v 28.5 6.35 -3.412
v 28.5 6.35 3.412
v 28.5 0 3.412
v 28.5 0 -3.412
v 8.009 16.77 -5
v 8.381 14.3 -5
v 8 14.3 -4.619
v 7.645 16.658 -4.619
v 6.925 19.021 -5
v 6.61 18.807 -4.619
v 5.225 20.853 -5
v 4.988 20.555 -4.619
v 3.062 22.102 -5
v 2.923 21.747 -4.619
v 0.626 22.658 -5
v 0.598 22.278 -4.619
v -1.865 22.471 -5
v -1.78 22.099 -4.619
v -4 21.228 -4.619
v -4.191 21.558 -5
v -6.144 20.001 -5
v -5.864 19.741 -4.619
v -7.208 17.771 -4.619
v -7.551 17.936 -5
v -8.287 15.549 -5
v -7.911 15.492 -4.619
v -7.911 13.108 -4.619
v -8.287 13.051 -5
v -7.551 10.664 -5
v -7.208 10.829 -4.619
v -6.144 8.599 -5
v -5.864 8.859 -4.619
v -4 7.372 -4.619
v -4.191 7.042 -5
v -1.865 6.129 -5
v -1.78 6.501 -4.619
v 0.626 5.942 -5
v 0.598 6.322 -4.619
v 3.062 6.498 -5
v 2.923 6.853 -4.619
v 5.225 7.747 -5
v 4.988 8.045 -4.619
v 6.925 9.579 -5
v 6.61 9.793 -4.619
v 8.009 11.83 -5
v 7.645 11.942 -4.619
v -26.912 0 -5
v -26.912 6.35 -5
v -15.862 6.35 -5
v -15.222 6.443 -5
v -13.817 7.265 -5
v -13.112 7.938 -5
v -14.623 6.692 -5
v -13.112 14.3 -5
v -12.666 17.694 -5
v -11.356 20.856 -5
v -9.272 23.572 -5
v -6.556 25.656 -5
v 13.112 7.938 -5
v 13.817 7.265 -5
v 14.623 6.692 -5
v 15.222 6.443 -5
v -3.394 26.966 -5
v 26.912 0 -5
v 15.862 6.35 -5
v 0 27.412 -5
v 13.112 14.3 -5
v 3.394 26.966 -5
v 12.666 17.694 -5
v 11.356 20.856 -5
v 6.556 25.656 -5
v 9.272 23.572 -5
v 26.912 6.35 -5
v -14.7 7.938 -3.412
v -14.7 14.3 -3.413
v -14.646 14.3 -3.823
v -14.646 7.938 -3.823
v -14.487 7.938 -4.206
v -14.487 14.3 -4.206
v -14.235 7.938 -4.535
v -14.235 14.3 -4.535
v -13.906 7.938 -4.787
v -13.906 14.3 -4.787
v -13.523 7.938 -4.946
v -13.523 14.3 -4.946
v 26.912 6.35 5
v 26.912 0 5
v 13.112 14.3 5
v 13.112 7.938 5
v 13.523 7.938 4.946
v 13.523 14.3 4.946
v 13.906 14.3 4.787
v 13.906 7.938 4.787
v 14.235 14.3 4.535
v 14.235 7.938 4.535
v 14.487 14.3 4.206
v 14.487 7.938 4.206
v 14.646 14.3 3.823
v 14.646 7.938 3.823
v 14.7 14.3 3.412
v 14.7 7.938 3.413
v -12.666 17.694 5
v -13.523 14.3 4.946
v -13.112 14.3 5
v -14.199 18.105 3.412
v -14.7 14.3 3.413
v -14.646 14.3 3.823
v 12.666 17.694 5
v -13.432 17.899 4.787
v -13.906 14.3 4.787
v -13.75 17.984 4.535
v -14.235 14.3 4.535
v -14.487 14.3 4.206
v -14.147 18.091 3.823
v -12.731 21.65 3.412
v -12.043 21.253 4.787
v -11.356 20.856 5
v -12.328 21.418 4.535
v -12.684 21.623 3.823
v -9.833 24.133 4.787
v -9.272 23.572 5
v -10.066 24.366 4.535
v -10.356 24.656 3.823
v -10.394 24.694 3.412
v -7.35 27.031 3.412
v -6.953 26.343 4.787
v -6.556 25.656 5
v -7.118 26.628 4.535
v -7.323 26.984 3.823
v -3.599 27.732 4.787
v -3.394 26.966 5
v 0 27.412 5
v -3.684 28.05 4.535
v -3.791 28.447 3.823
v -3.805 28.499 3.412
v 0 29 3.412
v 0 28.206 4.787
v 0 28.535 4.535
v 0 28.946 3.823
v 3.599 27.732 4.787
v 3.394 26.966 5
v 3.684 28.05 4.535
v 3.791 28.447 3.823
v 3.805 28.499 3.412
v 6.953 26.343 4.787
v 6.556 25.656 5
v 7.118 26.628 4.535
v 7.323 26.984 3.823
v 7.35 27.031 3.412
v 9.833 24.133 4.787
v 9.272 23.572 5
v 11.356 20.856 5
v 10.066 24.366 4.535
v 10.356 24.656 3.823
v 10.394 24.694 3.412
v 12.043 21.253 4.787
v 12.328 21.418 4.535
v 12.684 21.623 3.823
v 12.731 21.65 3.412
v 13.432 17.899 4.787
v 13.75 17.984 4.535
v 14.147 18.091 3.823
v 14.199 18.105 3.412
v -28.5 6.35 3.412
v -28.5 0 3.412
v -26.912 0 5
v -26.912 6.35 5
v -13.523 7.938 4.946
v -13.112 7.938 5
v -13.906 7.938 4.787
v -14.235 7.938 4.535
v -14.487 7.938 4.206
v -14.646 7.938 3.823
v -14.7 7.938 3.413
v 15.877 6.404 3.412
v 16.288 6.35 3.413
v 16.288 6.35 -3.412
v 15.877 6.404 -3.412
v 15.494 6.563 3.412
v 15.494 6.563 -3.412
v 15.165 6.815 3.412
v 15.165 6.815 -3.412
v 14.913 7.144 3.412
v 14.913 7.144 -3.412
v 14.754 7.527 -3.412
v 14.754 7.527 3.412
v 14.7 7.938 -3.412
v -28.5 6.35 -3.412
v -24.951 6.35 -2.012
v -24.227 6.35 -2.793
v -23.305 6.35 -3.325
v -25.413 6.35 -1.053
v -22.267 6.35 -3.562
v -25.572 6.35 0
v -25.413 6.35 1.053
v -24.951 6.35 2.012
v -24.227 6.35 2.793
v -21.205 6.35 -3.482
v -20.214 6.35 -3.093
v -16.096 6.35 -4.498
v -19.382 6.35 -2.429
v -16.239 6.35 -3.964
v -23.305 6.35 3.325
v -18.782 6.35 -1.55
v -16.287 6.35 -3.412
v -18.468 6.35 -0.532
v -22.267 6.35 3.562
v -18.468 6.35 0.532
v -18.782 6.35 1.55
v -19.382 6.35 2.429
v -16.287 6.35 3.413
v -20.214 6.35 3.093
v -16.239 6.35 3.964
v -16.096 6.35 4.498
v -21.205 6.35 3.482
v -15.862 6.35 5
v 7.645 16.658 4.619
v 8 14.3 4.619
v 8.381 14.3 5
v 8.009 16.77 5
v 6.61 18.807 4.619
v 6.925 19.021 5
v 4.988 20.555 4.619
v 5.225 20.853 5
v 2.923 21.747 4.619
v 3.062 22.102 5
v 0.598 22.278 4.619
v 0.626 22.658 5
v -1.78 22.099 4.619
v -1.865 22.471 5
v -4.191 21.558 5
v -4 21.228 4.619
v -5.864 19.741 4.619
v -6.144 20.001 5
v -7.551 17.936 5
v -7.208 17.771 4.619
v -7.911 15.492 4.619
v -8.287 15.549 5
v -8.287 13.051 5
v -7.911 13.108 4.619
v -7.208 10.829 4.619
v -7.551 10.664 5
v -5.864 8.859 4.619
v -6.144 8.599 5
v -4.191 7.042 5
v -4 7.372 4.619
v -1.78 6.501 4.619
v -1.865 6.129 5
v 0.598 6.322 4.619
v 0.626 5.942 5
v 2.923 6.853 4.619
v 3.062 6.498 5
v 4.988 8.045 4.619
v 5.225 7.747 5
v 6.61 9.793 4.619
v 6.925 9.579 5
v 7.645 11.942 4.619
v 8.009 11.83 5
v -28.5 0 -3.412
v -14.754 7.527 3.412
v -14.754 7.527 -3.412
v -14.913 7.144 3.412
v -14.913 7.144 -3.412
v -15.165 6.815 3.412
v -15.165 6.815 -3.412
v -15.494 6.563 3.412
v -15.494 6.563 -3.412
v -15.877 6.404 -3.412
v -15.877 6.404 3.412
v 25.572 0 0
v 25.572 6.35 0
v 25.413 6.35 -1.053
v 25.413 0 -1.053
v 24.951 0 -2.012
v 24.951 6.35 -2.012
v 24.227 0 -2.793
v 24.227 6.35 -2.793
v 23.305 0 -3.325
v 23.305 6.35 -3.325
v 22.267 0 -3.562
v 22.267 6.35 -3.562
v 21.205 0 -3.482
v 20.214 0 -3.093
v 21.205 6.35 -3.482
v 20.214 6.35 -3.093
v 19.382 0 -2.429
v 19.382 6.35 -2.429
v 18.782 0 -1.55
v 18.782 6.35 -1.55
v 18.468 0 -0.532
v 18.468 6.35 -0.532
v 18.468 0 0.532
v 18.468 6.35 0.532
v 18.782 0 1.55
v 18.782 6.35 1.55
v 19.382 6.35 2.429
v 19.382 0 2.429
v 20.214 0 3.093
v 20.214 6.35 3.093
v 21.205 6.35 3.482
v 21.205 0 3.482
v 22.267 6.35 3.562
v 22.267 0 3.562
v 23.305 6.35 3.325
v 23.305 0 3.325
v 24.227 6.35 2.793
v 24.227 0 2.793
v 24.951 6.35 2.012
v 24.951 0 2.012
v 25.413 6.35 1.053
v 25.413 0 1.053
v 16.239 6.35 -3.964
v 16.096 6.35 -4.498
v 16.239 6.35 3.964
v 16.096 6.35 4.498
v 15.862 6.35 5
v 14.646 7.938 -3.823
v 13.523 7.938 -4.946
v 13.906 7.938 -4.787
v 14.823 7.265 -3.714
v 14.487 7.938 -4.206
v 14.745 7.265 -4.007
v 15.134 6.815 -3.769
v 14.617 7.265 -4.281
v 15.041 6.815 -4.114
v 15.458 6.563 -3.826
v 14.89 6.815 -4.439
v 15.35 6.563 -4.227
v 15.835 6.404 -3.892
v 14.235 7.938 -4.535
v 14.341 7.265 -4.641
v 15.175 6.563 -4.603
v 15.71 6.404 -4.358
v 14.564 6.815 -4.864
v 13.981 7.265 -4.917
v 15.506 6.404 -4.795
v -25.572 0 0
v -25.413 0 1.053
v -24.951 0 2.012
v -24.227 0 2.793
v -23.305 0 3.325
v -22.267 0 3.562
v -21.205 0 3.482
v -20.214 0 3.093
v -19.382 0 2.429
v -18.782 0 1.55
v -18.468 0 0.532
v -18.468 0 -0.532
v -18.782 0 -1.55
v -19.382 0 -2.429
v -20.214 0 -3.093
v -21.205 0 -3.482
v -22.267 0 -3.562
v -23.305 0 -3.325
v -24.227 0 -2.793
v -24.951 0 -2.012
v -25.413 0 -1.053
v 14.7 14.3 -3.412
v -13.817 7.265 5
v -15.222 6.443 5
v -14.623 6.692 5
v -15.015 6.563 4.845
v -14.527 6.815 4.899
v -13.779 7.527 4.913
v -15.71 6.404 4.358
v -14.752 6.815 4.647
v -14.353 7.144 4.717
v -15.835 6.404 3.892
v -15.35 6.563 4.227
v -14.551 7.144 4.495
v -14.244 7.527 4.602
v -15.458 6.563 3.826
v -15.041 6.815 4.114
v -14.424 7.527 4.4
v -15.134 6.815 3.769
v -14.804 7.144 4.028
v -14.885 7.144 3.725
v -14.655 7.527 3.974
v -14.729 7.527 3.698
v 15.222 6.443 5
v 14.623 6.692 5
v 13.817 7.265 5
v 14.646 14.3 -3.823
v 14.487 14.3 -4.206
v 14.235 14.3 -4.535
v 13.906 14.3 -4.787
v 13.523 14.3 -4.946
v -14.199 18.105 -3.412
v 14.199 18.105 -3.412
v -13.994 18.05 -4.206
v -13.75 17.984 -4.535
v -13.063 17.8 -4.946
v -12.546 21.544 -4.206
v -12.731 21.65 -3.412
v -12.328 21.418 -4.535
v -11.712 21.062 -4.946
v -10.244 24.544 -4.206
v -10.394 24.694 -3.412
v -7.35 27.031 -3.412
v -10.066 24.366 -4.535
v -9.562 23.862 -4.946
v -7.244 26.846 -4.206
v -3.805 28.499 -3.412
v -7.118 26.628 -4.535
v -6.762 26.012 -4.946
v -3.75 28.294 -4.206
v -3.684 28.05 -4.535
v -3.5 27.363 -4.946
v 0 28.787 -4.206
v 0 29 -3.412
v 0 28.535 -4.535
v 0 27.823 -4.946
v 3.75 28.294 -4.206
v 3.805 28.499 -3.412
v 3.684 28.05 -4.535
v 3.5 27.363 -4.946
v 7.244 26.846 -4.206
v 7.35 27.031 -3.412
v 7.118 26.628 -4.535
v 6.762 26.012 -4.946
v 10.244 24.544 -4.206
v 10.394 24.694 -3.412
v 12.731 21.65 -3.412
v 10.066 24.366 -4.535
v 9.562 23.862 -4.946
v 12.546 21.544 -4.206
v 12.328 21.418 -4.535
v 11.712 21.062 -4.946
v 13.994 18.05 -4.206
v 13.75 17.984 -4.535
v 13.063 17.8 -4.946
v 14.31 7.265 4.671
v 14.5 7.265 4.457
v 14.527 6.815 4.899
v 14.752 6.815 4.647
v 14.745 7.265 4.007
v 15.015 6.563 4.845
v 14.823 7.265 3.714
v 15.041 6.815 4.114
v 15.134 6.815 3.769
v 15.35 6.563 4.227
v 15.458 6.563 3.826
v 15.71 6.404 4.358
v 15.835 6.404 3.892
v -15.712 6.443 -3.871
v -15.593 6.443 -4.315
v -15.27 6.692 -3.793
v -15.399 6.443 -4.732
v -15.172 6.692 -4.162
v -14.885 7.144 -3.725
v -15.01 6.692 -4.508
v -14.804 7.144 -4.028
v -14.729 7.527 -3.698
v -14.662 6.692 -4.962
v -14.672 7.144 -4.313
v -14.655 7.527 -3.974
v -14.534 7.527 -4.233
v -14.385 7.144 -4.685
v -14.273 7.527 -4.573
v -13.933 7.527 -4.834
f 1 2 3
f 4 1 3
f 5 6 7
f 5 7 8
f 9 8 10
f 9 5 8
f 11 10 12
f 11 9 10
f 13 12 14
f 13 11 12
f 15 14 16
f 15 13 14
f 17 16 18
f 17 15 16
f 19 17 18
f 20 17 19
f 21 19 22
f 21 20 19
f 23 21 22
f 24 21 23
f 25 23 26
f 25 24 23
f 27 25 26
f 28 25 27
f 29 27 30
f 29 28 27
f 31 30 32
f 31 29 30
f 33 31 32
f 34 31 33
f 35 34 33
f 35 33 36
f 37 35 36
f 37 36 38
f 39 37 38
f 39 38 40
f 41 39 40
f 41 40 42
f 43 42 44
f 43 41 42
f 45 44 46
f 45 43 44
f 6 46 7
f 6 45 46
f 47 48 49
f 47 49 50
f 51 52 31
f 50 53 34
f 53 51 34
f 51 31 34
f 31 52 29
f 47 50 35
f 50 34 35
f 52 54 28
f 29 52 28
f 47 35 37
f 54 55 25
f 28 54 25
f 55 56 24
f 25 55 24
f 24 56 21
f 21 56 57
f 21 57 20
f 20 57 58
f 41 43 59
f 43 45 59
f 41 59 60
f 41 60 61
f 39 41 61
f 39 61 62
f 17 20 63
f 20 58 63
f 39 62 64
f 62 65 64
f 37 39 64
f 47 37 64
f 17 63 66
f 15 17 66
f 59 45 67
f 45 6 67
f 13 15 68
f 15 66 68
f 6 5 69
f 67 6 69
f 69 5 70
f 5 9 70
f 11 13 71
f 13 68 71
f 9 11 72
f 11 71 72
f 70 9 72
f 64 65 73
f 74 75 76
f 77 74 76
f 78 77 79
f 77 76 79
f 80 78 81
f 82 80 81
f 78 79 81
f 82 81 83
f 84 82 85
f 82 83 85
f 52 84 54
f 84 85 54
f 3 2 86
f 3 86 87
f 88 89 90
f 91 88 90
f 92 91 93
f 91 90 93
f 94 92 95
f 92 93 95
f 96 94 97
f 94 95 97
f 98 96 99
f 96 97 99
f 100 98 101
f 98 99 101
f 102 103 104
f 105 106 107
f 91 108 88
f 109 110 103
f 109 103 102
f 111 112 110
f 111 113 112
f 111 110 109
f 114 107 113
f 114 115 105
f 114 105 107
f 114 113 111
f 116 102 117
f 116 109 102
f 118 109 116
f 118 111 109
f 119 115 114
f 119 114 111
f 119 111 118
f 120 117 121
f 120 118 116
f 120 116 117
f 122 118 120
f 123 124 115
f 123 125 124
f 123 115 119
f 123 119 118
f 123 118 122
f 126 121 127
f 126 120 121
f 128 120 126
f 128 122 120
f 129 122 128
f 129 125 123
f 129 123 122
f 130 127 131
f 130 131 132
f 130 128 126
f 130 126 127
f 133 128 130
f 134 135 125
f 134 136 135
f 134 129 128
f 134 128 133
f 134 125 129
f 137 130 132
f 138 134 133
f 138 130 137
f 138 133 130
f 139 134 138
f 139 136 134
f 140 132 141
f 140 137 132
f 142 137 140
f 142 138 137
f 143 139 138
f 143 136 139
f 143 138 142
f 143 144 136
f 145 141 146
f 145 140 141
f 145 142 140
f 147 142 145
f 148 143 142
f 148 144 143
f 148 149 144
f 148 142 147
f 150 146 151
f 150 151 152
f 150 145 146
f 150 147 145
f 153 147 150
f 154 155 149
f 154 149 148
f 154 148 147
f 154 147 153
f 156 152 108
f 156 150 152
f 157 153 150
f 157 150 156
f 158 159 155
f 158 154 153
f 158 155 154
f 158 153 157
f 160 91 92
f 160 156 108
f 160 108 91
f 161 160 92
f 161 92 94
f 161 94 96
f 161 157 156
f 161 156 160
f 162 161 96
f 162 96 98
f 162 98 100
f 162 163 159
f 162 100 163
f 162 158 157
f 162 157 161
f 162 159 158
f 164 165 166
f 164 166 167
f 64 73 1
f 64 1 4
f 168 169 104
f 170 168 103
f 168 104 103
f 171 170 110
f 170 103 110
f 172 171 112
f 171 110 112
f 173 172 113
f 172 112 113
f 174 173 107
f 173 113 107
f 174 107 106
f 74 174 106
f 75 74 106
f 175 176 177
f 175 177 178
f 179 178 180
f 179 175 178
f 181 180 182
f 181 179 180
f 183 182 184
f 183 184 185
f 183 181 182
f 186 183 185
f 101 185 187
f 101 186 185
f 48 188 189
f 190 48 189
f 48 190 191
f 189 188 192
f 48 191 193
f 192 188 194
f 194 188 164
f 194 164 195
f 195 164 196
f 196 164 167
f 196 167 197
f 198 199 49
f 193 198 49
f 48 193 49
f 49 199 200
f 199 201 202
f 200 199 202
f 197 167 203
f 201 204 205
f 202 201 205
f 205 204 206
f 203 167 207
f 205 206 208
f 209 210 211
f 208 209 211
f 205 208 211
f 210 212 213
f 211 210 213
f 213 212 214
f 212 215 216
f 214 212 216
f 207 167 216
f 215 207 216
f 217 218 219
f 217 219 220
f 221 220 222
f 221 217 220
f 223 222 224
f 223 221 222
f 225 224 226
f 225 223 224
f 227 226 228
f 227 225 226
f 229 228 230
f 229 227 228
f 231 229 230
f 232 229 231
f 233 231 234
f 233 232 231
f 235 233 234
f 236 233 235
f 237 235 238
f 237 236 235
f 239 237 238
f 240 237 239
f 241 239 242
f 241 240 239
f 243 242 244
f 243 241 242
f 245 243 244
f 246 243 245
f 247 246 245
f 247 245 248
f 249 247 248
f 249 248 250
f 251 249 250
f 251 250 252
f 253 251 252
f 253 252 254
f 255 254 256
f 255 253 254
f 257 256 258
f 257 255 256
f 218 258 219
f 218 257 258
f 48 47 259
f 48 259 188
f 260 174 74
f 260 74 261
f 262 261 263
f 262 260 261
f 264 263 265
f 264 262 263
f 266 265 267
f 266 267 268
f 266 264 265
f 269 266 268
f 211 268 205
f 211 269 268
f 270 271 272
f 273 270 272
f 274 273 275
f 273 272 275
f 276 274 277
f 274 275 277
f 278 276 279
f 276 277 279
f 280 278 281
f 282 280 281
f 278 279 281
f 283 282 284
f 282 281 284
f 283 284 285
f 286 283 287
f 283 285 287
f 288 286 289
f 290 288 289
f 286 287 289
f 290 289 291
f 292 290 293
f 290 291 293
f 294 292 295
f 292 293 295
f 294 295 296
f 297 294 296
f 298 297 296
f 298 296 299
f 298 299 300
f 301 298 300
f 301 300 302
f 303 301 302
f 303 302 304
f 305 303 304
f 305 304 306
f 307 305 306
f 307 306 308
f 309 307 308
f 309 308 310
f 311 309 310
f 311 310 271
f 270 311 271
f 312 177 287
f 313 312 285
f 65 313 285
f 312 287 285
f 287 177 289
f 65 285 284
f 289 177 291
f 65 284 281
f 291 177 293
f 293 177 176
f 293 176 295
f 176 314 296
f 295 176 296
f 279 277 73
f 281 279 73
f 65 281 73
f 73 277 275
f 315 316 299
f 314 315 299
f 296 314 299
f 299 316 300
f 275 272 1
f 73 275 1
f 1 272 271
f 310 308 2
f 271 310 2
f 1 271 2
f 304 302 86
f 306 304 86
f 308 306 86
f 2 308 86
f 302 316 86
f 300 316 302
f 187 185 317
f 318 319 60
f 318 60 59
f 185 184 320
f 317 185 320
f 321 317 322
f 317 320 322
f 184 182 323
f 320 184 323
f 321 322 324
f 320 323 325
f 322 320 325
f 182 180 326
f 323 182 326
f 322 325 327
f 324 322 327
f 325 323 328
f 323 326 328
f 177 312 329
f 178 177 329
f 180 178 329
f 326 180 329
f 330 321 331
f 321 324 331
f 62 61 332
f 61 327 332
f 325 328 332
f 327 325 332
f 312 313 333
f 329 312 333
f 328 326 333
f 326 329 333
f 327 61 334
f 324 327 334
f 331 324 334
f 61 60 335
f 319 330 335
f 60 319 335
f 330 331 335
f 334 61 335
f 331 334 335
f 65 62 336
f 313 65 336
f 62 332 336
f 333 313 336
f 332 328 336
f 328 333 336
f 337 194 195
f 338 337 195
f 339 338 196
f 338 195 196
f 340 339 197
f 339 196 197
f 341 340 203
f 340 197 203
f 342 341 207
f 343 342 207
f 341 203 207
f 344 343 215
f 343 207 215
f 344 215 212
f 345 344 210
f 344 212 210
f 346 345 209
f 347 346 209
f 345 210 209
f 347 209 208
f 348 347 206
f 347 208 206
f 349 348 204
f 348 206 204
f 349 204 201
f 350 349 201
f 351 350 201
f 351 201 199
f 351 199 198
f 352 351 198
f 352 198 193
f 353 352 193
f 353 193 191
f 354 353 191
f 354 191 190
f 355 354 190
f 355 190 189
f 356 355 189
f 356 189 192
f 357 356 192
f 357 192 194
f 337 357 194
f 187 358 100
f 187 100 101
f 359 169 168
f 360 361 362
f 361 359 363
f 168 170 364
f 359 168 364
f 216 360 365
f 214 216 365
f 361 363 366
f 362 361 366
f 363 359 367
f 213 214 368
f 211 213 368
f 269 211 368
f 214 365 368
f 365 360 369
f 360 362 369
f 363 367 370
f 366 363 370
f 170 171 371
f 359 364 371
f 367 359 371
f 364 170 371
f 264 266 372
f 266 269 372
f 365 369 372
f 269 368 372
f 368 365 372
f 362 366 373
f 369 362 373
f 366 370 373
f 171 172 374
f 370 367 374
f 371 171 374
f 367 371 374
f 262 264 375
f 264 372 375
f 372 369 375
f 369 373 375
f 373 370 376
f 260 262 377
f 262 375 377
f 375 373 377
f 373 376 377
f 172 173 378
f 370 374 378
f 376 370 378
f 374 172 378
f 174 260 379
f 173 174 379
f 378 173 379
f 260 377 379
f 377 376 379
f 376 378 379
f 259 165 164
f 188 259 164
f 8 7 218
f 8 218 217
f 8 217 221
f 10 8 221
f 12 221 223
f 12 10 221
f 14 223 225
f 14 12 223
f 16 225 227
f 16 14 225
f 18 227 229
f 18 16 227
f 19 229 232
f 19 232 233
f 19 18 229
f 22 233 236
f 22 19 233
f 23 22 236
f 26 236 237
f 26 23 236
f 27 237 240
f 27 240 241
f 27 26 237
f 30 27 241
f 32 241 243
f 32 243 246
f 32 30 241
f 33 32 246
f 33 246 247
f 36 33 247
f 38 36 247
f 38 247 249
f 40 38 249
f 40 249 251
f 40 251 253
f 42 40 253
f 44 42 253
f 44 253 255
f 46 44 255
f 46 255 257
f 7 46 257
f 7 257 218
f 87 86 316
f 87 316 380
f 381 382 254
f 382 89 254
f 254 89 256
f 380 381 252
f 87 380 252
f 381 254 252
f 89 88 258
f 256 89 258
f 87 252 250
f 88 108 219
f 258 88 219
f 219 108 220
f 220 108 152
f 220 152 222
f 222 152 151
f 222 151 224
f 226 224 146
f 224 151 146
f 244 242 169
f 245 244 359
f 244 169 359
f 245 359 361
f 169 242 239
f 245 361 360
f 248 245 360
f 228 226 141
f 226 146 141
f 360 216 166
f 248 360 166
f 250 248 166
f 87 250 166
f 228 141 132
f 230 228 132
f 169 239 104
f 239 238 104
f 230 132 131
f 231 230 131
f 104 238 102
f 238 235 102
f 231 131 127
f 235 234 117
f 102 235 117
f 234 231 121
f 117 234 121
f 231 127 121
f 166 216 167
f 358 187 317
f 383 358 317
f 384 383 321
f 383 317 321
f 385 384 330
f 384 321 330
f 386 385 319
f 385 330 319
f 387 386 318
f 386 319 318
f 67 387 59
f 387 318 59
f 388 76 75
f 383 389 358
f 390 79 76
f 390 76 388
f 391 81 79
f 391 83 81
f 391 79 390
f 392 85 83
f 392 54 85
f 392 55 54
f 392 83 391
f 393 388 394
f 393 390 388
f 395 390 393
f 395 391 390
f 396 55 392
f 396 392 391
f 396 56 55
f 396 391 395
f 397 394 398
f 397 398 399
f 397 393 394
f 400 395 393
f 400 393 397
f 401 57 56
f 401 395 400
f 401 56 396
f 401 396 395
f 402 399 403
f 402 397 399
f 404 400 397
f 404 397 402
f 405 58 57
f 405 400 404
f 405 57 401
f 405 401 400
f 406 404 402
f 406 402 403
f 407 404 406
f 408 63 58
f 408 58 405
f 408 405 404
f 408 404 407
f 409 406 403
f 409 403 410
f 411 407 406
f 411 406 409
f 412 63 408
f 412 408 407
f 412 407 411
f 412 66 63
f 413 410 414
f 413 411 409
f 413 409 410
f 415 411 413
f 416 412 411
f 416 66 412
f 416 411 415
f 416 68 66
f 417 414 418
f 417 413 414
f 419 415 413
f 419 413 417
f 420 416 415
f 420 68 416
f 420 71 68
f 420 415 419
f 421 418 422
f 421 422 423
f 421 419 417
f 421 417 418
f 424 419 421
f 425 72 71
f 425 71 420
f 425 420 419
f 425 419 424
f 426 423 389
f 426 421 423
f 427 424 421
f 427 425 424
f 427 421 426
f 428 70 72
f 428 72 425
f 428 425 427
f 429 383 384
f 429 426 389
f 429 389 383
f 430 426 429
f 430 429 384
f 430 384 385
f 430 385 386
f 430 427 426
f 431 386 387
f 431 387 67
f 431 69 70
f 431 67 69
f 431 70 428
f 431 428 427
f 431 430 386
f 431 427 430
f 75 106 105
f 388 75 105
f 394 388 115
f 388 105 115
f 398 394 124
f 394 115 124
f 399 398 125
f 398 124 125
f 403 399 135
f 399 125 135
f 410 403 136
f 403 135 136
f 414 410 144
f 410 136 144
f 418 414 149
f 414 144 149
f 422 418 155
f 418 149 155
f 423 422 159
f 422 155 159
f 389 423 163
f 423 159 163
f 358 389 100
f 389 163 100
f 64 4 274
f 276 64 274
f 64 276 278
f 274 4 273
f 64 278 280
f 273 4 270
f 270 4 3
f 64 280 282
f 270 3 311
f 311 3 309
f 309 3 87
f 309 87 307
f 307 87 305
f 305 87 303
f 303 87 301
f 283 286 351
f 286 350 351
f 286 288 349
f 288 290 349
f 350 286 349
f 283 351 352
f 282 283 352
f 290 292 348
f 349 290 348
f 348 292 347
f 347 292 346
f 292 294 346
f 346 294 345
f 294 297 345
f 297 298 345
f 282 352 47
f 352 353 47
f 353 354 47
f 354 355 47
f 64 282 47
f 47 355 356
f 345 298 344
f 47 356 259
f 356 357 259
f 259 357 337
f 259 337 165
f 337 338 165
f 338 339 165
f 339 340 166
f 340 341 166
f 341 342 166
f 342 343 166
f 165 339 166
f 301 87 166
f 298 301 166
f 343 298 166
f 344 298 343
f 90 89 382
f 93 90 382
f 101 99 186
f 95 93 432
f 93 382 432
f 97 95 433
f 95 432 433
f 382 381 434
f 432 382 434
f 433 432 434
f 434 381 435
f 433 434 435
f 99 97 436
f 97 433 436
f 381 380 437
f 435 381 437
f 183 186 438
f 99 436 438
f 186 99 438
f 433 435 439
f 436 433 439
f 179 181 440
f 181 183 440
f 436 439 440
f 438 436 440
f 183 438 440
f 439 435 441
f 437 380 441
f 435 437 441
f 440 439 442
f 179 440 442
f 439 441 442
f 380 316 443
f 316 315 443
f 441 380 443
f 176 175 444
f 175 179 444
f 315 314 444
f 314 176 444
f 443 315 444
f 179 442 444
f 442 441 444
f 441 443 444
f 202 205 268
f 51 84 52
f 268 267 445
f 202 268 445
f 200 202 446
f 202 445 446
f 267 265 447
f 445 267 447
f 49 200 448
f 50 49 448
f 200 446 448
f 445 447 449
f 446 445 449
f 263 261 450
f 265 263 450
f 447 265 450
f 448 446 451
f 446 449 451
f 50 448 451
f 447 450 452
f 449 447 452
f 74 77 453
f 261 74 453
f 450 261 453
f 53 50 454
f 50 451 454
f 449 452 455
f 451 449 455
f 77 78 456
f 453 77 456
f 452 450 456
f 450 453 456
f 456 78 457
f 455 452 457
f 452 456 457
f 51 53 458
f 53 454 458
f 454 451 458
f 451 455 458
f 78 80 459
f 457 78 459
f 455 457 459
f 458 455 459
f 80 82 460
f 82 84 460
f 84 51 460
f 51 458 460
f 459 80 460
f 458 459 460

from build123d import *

# Parameters (mm, degrees)
SKETCH2_R          = 8
BODY_EXTRUDE_DEPTH = 5
BODY_FILLET_A_R    = 1.5875
BODY_FILLET_B_R    = 1.5875
CHAMFER2_SIZE      = 1.5875
ID_CHAMFER_SIZE    = 0.381
SKETCH3_R          = 3.571875
HOLE_CUT_DEPTH     = 37.746054285


with BuildPart() as part:
    # Sketch2 → Body Extrude (new, symmetric)
    with BuildSketch(Plane.XY):
        with BuildLine():
            Line((-28.5, 0), (-28.5, 6.35))
            Line((-28.5, 6.35), (-14.7, 6.35))
            Line((-14.7, 6.35), (-14.7, 14.3))
            ThreePointArc((-14.7, 14.3), (0, 29), (14.7, 14.3))
            Line((14.7, 14.3), (14.7, 6.35))
            Line((14.7, 6.35), (28.5, 6.35))
            Line((28.5, 6.35), (28.5, 0))
            Line((28.5, 0), (-28.5, 0))
        make_face()
        with Locations((0, 14.3)):
            Circle(SKETCH2_R, mode=Mode.SUBTRACT)
    extrude(amount=BODY_EXTRUDE_DEPTH, both=True)

    # Body Fillet A
    body_fillet_a_edges = [part.edges().sort_by_distance(p)[0] for p in [
        (14.7, 10.325, 5),
        (0, 29, 5),
        (-14.7, 10.325, 5),
        (-14.7, 10.325, -5),
        (0, 29, -5),
        (14.7, 10.325, -5),
    ]]
    fillet(body_fillet_a_edges, radius=BODY_FILLET_A_R)

    # Body Fillet B
    # the kernel refuses this fillet: 1.5875 mm, written as the material it adds along each edge
    with BuildSketch(Plane(origin=(-14.7, 6.35, 3.4125), x_dir=(0, 1, 0), z_dir=(0, 0, -1))) as body_fillet_b_piece_1:
        with BuildLine():
            CenterArc((BODY_FILLET_B_R, -BODY_FILLET_B_R), BODY_FILLET_B_R, 90, 90)
            Line((0, -BODY_FILLET_B_R), (0, 0))
            Line((0, 0), (BODY_FILLET_B_R, 0))
        make_face()
    extrude(amount=6.825)
    with BuildSketch(Plane(origin=(14.7, 6.35, 3.4125), x_dir=(0, 1, 0), z_dir=(0, 0, -1))) as body_fillet_b_piece_2:
        with BuildLine():
            CenterArc((BODY_FILLET_B_R, BODY_FILLET_B_R), BODY_FILLET_B_R, 180, 90)
            Line((0, BODY_FILLET_B_R), (0, 0))
            Line((0, 0), (BODY_FILLET_B_R, 0))
        make_face()
    extrude(amount=6.825)
    with BuildSketch(Plane(origin=(-13.1125, 6.35, -3.4125), x_dir=(-1, 0, 0), z_dir=(0, 0, 1))) as body_fillet_b_piece_3_section:
        with BuildLine():
            CenterArc((1.5875 + BODY_FILLET_B_R, -BODY_FILLET_B_R), BODY_FILLET_B_R, 90, 90)
            Line((1.5875 + BODY_FILLET_B_R, 0), (1.5875, 0))
            Line((1.5875, 0), (1.5875, -BODY_FILLET_B_R))
        make_face()
    body_fillet_b_piece_3 = revolve(axis=Axis((-13.1125, 6.35, -3.4125), (0, -1, 0)), revolution_arc=233.296989237, mode=Mode.PRIVATE)
    body_fillet_b_piece_3 = split(body_fillet_b_piece_3, bisect_by=Plane(origin=(-14.303028138, 6.844709666, -5), z_dir=(0, 0, 1)), keep=Keep.TOP, mode=Mode.PRIVATE)
    add(body_fillet_b_piece_3)
    with BuildSketch(Plane(origin=(13.1125, 6.35, 3.4125), x_dir=(-0.597667277632828, 0, -0.8017442392976478), z_dir=(0.8017442392976478, 0, -0.597667277632828))) as body_fillet_b_piece_4_section:
        with BuildLine():
            CenterArc((1.5875 + BODY_FILLET_B_R, BODY_FILLET_B_R), BODY_FILLET_B_R, 180, 90)
            Line((1.5875, BODY_FILLET_B_R), (1.5875, 0))
            Line((1.5875, 0), (1.5875 + BODY_FILLET_B_R, 0))
        make_face()
    body_fillet_b_piece_4 = revolve(axis=Axis((13.1125, 6.35, 3.4125), (0, 1, 0)), revolution_arc=233.296989237, mode=Mode.PRIVATE)
    body_fillet_b_piece_4 = split(body_fillet_b_piece_4, bisect_by=Plane(origin=(14.303027956, 6.844710216, 5), z_dir=(0, 0, -1)), keep=Keep.TOP, mode=Mode.PRIVATE)
    add(body_fillet_b_piece_4)
    with BuildSketch(Plane(origin=(13.1125, 6.35, -3.4125), x_dir=(1, 0, 0), z_dir=(0, 0, 1))) as body_fillet_b_piece_5_section:
        with BuildLine():
            CenterArc((1.5875 + BODY_FILLET_B_R, BODY_FILLET_B_R), BODY_FILLET_B_R, 180, 90)
            Line((1.5875 + BODY_FILLET_B_R, 0), (1.5875, 0))
            Line((1.5875, 0), (1.5875, BODY_FILLET_B_R))
        make_face()
    body_fillet_b_piece_5 = revolve(axis=Axis((13.1125, 6.35, -3.4125), (0, 1, 0)), revolution_arc=233.296989237, mode=Mode.PRIVATE)
    body_fillet_b_piece_5 = split(body_fillet_b_piece_5, bisect_by=Plane(origin=(14.303027986, 6.84471004, -5), z_dir=(0, 0, 1)), keep=Keep.TOP, mode=Mode.PRIVATE)
    add(body_fillet_b_piece_5)
    with BuildSketch(Plane(origin=(-13.1125, 6.35, 3.4125), x_dir=(0.597667277632828, 0, -0.8017442392976478), z_dir=(-0.8017442392976478, 0, -0.597667277632828))) as body_fillet_b_piece_6_section:
        with BuildLine():
            CenterArc((1.5875 + BODY_FILLET_B_R, -BODY_FILLET_B_R), BODY_FILLET_B_R, 90, 90)
            Line((1.5875 + BODY_FILLET_B_R, 0), (1.5875, 0))
            Line((1.5875, 0), (1.5875, -BODY_FILLET_B_R))
        make_face()
    body_fillet_b_piece_6 = revolve(axis=Axis((-13.1125, 6.35, 3.4125), (0, -1, 0)), revolution_arc=233.296989237, mode=Mode.PRIVATE)
    body_fillet_b_piece_6 = split(body_fillet_b_piece_6, bisect_by=Plane(origin=(-14.30302807, 6.844709941, 5), z_dir=(0, 0, -1)), keep=Keep.TOP, mode=Mode.PRIVATE)
    add(body_fillet_b_piece_6)

    # Chamfer2
    chamfer2_edges = [part.edges().sort_by_distance(p)[0] for p in [
        (28.5, 3.175, -5),
        (-28.5, 3.175, 5),
        (28.5, 3.175, 5),
        (-28.5, 3.175, -5),
    ]]
    chamfer(chamfer2_edges, length=CHAMFER2_SIZE)

    # ID Chamfer
    id_chamfer_edges = [part.edges().sort_by_distance(p)[0] for p in [
        (-8, 14.3, -5),
        (-8, 14.3, 5),
    ]]
    chamfer(id_chamfer_edges, length=ID_CHAMFER_SIZE)

    # Sketch3 → Hole Cut (cut, through all)
    with BuildSketch(Plane(origin=(0, 6.35, 0), x_dir=(1, 0, 0), z_dir=(0, 1, 0))):
        with Locations(Location((-22, 0, 0), (0, 0, 180))):
            Circle(SKETCH3_R)
        with Locations((22, 0)):
            Circle(SKETCH3_R)
    extrude(amount=-HOLE_CUT_DEPTH, mode=Mode.SUBTRACT)


solid = part.part
